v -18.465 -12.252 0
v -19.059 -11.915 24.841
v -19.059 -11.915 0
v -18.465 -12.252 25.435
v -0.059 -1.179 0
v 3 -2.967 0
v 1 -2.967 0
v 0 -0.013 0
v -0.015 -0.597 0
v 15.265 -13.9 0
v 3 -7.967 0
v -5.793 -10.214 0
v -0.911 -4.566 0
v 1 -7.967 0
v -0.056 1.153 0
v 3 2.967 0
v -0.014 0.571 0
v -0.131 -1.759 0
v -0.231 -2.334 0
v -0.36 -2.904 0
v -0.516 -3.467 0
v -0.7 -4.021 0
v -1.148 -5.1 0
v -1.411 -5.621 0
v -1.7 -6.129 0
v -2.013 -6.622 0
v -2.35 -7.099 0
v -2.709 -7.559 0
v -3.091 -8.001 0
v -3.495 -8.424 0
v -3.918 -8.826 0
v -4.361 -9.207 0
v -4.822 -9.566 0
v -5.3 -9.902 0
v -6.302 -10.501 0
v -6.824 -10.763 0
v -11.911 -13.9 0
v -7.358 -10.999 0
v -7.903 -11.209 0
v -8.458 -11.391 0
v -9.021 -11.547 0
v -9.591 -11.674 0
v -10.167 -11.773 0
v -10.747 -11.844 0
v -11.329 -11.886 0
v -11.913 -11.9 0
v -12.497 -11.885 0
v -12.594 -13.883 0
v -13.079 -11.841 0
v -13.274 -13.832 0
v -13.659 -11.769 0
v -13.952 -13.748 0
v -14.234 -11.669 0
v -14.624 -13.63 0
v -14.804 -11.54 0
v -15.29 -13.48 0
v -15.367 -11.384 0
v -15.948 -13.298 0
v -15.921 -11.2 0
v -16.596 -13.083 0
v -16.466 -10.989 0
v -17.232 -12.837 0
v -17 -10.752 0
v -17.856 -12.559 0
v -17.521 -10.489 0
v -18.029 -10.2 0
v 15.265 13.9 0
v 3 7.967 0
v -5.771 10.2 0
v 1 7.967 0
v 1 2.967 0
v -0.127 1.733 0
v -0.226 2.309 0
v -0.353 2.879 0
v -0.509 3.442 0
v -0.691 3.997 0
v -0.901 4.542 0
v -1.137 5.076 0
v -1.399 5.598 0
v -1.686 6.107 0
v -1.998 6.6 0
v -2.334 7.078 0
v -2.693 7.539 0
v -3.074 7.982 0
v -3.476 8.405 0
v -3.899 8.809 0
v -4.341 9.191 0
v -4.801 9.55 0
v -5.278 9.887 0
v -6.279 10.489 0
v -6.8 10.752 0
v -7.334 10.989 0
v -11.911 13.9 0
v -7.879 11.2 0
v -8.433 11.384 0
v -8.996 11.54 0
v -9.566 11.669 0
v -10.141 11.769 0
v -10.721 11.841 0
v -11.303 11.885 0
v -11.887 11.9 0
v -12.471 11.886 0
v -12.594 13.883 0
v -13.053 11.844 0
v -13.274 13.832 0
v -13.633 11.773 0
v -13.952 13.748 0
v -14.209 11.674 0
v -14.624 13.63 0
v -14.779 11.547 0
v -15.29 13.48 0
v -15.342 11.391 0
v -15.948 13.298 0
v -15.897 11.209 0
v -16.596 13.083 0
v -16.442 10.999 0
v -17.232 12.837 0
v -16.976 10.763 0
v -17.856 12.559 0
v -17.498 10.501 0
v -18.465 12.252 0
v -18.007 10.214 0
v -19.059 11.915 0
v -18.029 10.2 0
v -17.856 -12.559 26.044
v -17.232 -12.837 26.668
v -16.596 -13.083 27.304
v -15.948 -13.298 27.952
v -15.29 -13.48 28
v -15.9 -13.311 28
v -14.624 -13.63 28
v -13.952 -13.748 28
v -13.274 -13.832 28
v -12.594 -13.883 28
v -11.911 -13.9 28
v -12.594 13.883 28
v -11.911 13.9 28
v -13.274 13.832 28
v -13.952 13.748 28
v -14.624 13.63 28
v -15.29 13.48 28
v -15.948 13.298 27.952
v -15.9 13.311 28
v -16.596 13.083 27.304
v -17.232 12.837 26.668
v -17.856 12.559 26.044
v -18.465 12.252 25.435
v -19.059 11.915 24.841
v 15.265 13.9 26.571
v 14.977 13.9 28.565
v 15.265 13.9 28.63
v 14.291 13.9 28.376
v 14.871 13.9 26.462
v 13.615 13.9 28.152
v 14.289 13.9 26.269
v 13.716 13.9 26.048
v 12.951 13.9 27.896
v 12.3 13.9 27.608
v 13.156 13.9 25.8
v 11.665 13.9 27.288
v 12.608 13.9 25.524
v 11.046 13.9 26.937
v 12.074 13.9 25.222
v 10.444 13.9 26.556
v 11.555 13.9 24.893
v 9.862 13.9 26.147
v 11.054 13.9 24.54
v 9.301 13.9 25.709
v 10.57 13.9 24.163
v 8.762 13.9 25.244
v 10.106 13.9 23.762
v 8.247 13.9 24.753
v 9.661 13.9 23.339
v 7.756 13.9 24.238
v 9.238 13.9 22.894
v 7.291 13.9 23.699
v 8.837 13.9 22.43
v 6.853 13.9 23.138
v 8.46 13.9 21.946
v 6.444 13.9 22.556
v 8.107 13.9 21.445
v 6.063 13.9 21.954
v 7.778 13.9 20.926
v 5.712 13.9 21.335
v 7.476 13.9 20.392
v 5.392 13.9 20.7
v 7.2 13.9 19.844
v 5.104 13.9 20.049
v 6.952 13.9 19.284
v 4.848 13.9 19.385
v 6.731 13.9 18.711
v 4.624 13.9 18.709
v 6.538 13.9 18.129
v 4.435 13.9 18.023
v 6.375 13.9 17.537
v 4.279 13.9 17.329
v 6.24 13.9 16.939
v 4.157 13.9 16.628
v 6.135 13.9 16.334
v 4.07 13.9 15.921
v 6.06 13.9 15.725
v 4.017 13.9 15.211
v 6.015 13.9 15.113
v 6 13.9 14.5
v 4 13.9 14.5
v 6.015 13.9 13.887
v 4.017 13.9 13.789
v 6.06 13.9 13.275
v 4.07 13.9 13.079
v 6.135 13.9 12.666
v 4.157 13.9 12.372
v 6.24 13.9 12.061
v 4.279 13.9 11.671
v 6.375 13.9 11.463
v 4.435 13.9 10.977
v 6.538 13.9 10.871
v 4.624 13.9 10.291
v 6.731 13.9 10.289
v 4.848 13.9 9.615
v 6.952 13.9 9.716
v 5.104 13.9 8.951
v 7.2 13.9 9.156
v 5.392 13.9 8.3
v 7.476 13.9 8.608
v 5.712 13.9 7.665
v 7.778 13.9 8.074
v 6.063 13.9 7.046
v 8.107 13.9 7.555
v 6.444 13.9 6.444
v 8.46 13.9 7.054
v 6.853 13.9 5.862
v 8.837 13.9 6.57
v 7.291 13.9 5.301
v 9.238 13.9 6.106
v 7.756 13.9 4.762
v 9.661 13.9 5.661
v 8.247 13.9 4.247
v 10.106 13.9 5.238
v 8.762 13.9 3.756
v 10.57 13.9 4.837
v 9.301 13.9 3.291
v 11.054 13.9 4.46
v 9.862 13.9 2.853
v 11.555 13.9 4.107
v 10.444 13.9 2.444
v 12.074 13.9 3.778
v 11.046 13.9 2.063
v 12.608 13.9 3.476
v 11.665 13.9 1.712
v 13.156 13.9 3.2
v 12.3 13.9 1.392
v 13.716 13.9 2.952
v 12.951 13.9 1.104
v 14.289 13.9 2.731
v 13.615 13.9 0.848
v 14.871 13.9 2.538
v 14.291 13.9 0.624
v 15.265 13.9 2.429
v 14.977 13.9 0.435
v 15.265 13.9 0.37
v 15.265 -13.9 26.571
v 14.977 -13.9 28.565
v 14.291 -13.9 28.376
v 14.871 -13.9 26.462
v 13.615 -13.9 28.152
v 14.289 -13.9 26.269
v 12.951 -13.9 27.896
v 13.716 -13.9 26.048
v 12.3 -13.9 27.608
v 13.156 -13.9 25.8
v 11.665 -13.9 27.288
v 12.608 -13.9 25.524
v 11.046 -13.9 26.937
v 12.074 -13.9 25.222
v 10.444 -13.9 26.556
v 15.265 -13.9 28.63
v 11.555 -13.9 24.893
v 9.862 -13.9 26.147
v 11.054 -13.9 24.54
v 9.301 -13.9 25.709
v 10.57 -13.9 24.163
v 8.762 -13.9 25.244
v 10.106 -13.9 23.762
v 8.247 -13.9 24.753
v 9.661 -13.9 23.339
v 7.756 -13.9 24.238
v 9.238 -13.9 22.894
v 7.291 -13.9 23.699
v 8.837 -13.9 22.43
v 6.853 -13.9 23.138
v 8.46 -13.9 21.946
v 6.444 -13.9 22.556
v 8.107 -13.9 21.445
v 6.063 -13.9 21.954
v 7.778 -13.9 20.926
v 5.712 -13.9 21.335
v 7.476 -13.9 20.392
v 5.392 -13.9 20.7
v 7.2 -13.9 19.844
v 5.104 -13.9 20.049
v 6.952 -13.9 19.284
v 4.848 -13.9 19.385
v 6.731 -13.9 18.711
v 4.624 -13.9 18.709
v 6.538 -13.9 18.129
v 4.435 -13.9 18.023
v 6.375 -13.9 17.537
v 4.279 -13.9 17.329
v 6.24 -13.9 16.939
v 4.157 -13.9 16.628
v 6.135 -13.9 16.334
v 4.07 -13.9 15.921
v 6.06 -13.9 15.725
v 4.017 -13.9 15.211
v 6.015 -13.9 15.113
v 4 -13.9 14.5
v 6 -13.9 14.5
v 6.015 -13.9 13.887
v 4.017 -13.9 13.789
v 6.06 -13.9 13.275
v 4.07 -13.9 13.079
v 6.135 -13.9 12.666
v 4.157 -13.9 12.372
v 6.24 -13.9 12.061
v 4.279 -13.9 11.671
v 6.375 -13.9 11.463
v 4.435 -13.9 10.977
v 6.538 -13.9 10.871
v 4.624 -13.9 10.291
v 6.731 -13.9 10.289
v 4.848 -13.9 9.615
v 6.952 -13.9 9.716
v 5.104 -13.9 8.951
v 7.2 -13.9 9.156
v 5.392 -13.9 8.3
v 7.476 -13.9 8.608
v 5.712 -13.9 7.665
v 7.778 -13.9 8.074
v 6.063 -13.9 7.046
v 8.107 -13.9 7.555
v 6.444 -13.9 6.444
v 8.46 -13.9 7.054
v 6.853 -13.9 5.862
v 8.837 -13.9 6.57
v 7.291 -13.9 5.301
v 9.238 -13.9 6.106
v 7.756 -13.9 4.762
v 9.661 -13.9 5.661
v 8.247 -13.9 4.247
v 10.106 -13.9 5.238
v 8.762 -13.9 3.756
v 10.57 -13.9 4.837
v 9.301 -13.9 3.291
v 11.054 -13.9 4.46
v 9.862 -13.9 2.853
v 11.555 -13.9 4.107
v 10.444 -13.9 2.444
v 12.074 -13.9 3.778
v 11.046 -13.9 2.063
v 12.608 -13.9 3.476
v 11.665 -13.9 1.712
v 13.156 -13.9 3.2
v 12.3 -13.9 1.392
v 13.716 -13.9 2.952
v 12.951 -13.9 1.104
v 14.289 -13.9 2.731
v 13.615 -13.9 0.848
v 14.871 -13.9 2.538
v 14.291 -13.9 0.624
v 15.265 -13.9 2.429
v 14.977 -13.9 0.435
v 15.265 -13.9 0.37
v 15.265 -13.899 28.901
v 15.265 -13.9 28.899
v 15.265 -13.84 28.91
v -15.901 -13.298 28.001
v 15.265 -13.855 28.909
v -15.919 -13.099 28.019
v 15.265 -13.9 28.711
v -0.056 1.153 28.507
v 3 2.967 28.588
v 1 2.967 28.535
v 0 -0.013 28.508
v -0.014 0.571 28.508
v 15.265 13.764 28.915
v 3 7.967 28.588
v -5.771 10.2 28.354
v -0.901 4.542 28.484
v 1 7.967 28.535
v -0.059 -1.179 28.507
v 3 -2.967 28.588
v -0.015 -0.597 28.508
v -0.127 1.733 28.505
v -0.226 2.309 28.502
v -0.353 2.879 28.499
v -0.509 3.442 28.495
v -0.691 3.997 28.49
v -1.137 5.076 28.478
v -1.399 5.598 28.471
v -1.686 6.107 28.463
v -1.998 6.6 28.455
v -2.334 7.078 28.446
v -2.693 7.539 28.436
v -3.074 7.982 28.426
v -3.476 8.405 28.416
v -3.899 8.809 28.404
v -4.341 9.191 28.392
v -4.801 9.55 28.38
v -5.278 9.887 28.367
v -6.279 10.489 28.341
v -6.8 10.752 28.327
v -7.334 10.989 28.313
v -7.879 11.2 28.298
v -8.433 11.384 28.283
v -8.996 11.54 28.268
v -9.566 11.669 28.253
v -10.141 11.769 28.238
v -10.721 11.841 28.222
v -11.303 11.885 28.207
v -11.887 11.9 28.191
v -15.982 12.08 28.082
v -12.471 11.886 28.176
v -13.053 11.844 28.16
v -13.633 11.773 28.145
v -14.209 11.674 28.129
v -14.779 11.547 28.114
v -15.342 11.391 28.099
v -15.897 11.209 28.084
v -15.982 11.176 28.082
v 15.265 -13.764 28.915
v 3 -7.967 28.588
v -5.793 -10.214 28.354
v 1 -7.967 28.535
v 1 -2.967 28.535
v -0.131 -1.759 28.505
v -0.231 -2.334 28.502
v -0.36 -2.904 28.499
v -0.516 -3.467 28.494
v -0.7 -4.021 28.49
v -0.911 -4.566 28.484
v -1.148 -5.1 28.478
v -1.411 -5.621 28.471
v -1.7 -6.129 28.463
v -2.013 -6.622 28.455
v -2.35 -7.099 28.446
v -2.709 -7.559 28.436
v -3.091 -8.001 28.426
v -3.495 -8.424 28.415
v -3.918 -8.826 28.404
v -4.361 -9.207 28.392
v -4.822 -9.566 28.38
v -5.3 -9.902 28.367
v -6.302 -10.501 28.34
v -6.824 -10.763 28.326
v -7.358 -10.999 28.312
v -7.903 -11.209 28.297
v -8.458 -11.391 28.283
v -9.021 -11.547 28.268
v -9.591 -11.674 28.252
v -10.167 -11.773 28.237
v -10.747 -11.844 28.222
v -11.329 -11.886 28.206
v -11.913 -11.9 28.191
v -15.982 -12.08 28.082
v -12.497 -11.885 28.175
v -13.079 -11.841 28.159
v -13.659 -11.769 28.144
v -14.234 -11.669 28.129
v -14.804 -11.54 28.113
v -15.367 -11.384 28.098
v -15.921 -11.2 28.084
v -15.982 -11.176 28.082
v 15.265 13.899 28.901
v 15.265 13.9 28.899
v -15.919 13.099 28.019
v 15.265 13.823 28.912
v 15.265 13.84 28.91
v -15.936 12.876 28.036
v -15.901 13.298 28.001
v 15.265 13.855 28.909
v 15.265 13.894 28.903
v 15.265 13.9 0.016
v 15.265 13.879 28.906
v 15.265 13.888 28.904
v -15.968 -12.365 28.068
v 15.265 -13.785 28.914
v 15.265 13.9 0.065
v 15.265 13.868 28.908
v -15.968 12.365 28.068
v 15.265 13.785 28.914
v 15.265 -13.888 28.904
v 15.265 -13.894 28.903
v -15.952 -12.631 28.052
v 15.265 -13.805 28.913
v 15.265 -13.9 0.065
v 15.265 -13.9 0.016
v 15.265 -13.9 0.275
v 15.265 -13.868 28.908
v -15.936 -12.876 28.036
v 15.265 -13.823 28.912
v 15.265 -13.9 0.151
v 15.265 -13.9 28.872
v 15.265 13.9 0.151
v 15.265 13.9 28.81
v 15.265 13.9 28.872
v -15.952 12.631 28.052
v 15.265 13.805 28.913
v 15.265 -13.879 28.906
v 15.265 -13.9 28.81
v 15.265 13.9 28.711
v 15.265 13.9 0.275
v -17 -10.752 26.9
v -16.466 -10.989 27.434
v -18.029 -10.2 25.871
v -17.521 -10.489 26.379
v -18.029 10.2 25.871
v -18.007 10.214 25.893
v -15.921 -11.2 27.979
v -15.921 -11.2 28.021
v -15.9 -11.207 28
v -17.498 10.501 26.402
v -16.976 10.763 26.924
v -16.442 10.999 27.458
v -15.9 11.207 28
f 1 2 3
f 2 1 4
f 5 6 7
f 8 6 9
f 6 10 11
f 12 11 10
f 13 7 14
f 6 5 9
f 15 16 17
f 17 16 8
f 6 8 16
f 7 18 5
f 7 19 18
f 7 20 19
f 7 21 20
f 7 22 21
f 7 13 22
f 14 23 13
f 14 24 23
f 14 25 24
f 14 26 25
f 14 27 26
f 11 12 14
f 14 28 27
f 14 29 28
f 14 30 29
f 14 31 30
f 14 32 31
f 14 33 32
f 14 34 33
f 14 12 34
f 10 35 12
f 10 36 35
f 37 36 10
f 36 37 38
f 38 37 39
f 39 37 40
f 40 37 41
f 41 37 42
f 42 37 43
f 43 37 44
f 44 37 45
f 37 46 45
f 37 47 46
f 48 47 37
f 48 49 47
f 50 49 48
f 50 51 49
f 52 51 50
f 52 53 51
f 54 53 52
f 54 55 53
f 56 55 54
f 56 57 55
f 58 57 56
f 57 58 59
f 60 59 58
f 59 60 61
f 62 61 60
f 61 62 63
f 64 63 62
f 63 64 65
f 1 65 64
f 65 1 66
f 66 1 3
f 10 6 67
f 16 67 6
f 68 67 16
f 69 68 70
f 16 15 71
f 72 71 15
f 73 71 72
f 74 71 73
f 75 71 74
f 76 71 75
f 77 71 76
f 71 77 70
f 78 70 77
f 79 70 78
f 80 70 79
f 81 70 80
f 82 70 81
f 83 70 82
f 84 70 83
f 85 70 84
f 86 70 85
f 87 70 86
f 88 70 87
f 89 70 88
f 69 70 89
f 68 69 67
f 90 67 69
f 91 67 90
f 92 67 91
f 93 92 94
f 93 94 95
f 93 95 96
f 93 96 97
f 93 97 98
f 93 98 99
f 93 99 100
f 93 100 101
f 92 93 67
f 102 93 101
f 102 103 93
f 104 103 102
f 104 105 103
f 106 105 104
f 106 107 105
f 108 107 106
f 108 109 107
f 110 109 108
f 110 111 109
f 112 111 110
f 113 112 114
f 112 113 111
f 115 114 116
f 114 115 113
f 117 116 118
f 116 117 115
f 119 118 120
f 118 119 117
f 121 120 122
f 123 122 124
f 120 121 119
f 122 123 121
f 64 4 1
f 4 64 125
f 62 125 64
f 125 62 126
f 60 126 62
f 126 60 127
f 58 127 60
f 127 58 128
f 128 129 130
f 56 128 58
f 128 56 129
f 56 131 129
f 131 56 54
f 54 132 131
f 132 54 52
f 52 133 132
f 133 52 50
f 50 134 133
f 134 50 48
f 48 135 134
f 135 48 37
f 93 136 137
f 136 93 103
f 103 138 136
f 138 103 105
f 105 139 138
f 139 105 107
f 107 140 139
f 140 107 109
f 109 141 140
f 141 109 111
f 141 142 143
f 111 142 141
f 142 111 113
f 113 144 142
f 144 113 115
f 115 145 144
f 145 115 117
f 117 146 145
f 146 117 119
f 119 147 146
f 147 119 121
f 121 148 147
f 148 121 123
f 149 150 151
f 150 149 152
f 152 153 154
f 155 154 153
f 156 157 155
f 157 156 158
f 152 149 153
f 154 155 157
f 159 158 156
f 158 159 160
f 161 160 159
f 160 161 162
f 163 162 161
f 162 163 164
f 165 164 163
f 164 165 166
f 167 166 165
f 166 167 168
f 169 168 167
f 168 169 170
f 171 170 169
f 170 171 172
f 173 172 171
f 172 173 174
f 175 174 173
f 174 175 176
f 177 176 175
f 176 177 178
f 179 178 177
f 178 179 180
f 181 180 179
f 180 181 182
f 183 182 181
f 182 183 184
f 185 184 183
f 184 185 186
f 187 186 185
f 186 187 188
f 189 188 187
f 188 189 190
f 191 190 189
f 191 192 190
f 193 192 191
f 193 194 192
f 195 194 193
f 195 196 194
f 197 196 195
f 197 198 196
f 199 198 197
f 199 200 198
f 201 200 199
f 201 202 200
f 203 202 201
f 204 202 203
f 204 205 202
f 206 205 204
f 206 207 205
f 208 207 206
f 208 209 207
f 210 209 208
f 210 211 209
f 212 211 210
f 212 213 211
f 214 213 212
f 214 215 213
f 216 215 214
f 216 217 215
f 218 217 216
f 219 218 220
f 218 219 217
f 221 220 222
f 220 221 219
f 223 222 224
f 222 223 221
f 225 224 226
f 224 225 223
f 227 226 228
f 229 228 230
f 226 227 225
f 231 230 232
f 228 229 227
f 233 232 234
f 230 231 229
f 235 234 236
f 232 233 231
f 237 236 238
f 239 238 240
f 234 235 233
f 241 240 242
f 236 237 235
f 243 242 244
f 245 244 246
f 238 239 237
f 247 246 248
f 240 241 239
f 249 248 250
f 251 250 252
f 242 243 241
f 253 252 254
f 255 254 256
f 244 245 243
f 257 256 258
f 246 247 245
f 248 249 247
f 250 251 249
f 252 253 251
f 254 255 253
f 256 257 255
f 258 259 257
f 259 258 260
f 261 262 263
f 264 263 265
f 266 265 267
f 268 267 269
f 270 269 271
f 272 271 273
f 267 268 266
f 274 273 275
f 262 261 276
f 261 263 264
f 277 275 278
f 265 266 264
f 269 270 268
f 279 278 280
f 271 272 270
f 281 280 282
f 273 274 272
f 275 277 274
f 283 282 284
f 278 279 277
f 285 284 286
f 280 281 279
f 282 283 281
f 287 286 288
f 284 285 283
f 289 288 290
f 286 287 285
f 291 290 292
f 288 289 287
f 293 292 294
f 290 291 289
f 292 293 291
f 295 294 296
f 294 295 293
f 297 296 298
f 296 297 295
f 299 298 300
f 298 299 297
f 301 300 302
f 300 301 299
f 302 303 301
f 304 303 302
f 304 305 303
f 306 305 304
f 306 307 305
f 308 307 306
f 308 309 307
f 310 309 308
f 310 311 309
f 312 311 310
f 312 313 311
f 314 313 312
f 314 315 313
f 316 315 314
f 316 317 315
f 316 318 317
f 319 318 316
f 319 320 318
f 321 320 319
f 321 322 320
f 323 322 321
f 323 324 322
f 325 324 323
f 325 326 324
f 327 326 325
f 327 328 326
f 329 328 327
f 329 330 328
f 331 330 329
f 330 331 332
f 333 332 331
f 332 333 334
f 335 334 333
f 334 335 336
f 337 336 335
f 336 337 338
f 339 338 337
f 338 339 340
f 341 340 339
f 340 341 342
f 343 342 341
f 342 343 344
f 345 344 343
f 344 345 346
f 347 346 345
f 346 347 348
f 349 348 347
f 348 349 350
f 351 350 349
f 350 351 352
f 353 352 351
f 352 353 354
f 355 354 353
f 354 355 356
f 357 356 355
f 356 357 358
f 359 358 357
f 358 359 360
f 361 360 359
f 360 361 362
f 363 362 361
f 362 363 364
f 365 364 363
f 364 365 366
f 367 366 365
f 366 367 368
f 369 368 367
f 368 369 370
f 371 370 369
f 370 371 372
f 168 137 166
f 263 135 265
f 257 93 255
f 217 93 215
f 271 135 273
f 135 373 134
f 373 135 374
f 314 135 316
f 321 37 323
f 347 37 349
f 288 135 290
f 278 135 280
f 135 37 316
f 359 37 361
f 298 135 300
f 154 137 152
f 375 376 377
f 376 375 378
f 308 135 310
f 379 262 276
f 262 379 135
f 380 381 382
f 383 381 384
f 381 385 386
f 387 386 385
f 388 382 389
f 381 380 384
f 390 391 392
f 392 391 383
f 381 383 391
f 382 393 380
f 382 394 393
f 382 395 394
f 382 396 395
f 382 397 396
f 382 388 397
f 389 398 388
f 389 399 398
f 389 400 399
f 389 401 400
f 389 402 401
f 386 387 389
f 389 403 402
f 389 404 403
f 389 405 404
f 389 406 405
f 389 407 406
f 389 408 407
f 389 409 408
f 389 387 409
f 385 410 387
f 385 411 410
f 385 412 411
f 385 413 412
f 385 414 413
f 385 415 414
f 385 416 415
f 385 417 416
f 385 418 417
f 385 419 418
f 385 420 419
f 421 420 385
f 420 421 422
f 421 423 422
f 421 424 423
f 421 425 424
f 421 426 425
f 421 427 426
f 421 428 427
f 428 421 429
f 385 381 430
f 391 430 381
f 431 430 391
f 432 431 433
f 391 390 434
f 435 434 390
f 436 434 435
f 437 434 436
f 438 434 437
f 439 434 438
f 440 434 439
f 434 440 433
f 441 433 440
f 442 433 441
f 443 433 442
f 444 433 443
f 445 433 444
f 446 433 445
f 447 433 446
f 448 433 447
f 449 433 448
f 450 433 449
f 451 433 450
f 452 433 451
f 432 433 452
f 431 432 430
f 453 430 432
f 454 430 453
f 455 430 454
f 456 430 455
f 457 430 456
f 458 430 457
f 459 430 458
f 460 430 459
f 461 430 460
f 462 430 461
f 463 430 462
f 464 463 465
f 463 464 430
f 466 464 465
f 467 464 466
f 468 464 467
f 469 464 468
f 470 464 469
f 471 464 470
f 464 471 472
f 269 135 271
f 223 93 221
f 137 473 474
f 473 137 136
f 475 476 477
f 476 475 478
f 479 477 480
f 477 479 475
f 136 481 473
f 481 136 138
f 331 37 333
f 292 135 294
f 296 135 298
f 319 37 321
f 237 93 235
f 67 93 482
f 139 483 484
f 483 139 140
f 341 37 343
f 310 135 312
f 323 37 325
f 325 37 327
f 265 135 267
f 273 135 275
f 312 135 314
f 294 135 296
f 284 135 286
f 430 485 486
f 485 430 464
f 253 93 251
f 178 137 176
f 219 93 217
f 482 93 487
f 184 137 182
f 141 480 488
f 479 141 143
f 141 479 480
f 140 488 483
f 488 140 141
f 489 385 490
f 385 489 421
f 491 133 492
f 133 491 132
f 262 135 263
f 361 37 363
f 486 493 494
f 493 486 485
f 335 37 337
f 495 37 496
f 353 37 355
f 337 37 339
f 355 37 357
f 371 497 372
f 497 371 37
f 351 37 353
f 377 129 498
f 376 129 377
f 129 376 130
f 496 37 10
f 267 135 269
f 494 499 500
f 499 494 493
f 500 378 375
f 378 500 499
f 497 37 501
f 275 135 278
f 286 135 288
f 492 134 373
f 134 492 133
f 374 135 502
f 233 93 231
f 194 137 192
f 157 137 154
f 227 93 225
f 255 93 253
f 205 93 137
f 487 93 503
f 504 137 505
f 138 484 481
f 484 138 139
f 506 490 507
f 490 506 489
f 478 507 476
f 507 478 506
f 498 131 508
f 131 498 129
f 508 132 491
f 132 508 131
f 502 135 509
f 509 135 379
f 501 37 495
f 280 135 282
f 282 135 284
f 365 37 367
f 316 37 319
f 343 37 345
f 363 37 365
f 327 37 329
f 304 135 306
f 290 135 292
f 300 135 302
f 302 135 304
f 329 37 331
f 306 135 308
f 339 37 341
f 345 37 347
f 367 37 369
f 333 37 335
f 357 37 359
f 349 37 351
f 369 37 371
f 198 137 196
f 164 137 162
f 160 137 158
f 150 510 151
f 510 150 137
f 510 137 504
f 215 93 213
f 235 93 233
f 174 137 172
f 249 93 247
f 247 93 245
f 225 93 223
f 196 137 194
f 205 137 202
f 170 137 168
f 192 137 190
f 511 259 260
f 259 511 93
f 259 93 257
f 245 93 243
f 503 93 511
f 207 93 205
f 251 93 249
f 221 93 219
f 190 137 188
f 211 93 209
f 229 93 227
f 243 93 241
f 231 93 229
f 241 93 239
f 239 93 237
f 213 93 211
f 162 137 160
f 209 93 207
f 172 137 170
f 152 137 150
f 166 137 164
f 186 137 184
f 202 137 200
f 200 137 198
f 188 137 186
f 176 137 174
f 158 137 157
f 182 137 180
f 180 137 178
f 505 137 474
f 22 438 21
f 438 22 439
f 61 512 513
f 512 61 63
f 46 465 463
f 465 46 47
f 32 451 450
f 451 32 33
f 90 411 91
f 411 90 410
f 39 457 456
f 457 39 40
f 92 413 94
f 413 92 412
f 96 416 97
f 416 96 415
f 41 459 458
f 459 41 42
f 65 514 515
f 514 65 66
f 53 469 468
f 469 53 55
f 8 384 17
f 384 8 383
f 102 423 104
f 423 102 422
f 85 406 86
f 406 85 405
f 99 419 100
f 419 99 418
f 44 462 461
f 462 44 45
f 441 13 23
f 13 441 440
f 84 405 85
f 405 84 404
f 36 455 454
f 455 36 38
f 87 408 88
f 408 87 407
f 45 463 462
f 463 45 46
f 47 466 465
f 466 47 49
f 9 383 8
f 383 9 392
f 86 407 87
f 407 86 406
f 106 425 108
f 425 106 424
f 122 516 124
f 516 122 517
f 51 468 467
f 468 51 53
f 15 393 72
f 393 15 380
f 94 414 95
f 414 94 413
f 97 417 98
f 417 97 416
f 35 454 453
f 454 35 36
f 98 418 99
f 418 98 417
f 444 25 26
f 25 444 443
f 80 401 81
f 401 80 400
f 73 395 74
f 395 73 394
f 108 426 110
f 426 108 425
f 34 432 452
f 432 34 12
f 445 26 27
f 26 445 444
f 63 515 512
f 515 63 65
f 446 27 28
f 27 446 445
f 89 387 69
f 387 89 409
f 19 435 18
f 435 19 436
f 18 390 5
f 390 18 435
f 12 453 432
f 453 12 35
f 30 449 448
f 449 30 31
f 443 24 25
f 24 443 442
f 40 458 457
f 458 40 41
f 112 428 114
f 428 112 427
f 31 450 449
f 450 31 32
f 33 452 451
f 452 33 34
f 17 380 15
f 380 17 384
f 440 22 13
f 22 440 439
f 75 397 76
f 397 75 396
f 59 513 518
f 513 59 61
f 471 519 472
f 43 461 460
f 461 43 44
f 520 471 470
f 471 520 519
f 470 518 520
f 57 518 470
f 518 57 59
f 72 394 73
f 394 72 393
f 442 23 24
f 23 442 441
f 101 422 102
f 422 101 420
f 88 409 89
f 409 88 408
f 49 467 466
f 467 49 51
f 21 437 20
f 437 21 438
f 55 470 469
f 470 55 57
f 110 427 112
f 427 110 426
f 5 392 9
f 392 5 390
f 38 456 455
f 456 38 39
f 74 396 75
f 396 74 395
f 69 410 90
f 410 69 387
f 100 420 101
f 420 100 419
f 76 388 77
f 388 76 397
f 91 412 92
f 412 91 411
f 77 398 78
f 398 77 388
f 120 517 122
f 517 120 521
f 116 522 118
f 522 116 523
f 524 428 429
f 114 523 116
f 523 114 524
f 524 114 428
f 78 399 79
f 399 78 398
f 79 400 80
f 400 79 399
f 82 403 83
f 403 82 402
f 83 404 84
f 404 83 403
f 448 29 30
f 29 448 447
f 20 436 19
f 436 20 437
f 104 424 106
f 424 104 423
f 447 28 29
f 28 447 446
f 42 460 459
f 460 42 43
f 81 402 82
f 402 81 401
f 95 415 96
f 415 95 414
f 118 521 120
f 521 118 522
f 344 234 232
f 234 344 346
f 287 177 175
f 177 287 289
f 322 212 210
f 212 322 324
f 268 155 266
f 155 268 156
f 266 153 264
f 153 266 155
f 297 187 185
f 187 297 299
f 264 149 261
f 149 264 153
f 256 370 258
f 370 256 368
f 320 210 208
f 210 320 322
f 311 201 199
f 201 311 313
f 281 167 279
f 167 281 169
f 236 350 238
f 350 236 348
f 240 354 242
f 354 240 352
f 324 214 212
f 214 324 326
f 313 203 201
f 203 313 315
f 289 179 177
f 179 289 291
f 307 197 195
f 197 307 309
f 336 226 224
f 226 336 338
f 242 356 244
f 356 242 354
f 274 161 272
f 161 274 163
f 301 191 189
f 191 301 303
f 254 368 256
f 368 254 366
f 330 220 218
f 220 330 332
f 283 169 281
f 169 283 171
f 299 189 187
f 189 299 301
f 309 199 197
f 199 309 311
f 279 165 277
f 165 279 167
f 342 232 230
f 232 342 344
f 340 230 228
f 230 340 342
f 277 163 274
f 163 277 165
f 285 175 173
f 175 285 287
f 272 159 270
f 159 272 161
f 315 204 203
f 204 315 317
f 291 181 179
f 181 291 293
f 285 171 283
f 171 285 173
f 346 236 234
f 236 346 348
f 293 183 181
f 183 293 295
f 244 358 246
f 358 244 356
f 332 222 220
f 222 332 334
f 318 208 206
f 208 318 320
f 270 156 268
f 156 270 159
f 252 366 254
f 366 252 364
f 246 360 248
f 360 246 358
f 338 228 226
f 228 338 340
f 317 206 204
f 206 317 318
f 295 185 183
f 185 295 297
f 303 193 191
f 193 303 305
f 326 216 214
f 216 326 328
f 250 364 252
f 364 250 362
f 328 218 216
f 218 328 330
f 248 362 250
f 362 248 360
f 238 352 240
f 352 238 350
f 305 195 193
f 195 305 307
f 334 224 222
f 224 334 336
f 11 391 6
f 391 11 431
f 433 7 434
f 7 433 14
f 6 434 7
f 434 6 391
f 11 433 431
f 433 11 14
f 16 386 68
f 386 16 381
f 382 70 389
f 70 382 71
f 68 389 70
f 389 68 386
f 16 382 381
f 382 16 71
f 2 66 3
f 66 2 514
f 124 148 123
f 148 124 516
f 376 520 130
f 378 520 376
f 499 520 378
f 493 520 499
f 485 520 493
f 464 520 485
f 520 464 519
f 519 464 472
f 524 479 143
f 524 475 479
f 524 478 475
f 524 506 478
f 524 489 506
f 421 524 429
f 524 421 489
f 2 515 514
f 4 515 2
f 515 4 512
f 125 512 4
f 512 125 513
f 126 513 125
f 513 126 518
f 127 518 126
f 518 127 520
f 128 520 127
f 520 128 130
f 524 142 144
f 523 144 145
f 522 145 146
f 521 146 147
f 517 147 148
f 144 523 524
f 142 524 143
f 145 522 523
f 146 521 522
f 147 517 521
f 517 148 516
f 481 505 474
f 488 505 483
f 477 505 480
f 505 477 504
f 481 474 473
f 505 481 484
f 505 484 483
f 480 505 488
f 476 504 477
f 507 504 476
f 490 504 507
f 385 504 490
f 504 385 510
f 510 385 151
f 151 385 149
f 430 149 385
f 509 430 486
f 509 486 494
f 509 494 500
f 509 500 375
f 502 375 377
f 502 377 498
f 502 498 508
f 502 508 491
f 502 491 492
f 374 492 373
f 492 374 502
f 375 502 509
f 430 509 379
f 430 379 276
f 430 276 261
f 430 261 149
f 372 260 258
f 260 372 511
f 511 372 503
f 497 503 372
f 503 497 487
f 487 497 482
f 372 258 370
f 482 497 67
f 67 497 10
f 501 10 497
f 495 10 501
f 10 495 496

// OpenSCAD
//<params>
flashlightDiameter = 23.8;
flashlightGripLength = 28;
flashlightGripAngle = 242   ;
handlebarDiameter = 25; 
handlebarGripAngle = 150;
gripThickness = 2;
trimmedHull = 0; //[0:no,1:yes]
ziptieHoleThickness = 2;
ziptieHoleWidth = 5;
trimOffset = 8;
ziptieHoleWall = 1;
//</params>

module dummy() {}

$fn = 128;

heightFlash = flashlightGripLength;
heightHandle = 2*gripThickness + handlebarDiameter;
minHeight = min(heightFlash,heightHandle);

module grip(id=20,thickness=gripThickness,length=20,angle=180,insideOnly=false) {
    translate([-id/2,0,0]) 
    rotate([0,0,-angle/2])
    if (insideOnly)
        translate([0,0,-100]) cylinder(d=id,h=length+200);
    else 
        rotate_extrude(angle=angle) translate([id/2,0,0]) square([thickness,length]);
}

spacing = ziptieHoleThickness + 2*ziptieHoleWall;

handlebarGripLength = flashlightDiameter+gripThickness*2;

module pair(insideOnly=false) {
    grip(id=flashlightDiameter,length=flashlightGripLength,angle=flashlightGripAngle,insideOnly=insideOnly);

    translate([spacing,0,handlebarDiameter/2+gripThickness]) 
    translate([gripThickness,0,0]) 
    rotate([90,0,0]) 
    rotate([0,0,180]) 
    translate([0,0,-handlebarGripLength/2]) 
    grip(id=handlebarDiameter,length=handlebarGripLength,angle=180,insideOnly=insideOnly);
}

holeSpacing = (handlebarGripLength - 2 * ziptieHoleWidth) / 3;
holeLocation = holeSpacing / 2 + ziptieHoleWidth / 2;

module flashlightSnip() {
    translate([-flashlightDiameter/2,0,0])
    linear_extrude(height=flashlightGripLength*3,center=true) 
        polygon([ [0,0], 200*[cos(flashlightGripAngle/2),sin(flashlightGripAngle/2)], 200*[cos(flashlightGripAngle/2),-sin(flashlightGripAngle/2)] ]);
}

module trim() {
    translate([-flashlightDiameter-trimOffset,0,flashlightGripLength])  rotate([90,0,0]) cylinder(d=flashlightDiameter+2*gripThickness*2,h=200,$fn=4,center=true);
}

module main() {
    height=max(handlebarDiameter+2*gripThickness,flashlightGripLength);
    dx = handlebarDiameter/2 * cos((360-handlebarGripAngle)/2);
    difference() {
        union() {
            hull() intersection() {
                pair();
                if (trimmedHull) cube([200,200,minHeight*2],center=true);
            }
            pair();
        }
        pair(insideOnly=true);
        flashlightSnip();
        for (s=[-1,1]) translate([ziptieHoleThickness/2+ziptieHoleWall,holeLocation*s,height/2-.01]) cube([ziptieHoleThickness,ziptieHoleWidth,height+.05],center=true);
            trim();
        translate([dx+handlebarDiameter/2+spacing+gripThickness,-100,-1]) cube([200,200,200]);
    }
}

main();
